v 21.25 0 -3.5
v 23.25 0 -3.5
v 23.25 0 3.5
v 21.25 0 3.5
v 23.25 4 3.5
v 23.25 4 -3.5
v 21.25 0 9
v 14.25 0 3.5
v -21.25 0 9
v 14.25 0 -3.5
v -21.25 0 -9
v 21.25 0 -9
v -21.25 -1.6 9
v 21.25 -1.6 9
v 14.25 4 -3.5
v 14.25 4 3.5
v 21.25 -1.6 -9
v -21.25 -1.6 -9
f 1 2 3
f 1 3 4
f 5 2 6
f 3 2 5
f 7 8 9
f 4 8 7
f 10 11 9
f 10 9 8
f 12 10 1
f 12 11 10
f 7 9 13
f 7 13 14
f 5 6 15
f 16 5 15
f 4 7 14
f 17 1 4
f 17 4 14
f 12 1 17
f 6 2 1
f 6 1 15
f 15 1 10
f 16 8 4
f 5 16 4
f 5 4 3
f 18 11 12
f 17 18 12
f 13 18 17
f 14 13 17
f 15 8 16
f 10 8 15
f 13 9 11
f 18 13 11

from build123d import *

# Parameters (mm, degrees)
ESBO_O1_W                = 42.5
ESBO_O1_H                = 18
RESSALTO_EXTRUS_O1_DEPTH = 1.6
RESSALTO_EXTRUS_O2_DEPTH = 4


with BuildPart() as part:
    # Esboço1 → Ressalto-extrusão1 (new body)
    with BuildSketch(Plane(origin=(0, 0, 0), x_dir=(1, 0, 0), z_dir=(0, 1, 0))):
        Rectangle(ESBO_O1_W, ESBO_O1_H)
    extrude(amount=-RESSALTO_EXTRUS_O1_DEPTH)

    # Esboço2 → Ressalto-extrusão2 (add)
    with BuildSketch(Plane(origin=(0, 0, 0), x_dir=(1, 0, 0), z_dir=(0, 1, 0))):
        Polygon((21.25, 3.5), (23.25, 3.5), (23.25, -3.5), (21.25, -3.5), (14.25, -3.5), (14.25, 3.5), align=None)
    extrude(amount=RESSALTO_EXTRUS_O2_DEPTH)


solid = part.part
